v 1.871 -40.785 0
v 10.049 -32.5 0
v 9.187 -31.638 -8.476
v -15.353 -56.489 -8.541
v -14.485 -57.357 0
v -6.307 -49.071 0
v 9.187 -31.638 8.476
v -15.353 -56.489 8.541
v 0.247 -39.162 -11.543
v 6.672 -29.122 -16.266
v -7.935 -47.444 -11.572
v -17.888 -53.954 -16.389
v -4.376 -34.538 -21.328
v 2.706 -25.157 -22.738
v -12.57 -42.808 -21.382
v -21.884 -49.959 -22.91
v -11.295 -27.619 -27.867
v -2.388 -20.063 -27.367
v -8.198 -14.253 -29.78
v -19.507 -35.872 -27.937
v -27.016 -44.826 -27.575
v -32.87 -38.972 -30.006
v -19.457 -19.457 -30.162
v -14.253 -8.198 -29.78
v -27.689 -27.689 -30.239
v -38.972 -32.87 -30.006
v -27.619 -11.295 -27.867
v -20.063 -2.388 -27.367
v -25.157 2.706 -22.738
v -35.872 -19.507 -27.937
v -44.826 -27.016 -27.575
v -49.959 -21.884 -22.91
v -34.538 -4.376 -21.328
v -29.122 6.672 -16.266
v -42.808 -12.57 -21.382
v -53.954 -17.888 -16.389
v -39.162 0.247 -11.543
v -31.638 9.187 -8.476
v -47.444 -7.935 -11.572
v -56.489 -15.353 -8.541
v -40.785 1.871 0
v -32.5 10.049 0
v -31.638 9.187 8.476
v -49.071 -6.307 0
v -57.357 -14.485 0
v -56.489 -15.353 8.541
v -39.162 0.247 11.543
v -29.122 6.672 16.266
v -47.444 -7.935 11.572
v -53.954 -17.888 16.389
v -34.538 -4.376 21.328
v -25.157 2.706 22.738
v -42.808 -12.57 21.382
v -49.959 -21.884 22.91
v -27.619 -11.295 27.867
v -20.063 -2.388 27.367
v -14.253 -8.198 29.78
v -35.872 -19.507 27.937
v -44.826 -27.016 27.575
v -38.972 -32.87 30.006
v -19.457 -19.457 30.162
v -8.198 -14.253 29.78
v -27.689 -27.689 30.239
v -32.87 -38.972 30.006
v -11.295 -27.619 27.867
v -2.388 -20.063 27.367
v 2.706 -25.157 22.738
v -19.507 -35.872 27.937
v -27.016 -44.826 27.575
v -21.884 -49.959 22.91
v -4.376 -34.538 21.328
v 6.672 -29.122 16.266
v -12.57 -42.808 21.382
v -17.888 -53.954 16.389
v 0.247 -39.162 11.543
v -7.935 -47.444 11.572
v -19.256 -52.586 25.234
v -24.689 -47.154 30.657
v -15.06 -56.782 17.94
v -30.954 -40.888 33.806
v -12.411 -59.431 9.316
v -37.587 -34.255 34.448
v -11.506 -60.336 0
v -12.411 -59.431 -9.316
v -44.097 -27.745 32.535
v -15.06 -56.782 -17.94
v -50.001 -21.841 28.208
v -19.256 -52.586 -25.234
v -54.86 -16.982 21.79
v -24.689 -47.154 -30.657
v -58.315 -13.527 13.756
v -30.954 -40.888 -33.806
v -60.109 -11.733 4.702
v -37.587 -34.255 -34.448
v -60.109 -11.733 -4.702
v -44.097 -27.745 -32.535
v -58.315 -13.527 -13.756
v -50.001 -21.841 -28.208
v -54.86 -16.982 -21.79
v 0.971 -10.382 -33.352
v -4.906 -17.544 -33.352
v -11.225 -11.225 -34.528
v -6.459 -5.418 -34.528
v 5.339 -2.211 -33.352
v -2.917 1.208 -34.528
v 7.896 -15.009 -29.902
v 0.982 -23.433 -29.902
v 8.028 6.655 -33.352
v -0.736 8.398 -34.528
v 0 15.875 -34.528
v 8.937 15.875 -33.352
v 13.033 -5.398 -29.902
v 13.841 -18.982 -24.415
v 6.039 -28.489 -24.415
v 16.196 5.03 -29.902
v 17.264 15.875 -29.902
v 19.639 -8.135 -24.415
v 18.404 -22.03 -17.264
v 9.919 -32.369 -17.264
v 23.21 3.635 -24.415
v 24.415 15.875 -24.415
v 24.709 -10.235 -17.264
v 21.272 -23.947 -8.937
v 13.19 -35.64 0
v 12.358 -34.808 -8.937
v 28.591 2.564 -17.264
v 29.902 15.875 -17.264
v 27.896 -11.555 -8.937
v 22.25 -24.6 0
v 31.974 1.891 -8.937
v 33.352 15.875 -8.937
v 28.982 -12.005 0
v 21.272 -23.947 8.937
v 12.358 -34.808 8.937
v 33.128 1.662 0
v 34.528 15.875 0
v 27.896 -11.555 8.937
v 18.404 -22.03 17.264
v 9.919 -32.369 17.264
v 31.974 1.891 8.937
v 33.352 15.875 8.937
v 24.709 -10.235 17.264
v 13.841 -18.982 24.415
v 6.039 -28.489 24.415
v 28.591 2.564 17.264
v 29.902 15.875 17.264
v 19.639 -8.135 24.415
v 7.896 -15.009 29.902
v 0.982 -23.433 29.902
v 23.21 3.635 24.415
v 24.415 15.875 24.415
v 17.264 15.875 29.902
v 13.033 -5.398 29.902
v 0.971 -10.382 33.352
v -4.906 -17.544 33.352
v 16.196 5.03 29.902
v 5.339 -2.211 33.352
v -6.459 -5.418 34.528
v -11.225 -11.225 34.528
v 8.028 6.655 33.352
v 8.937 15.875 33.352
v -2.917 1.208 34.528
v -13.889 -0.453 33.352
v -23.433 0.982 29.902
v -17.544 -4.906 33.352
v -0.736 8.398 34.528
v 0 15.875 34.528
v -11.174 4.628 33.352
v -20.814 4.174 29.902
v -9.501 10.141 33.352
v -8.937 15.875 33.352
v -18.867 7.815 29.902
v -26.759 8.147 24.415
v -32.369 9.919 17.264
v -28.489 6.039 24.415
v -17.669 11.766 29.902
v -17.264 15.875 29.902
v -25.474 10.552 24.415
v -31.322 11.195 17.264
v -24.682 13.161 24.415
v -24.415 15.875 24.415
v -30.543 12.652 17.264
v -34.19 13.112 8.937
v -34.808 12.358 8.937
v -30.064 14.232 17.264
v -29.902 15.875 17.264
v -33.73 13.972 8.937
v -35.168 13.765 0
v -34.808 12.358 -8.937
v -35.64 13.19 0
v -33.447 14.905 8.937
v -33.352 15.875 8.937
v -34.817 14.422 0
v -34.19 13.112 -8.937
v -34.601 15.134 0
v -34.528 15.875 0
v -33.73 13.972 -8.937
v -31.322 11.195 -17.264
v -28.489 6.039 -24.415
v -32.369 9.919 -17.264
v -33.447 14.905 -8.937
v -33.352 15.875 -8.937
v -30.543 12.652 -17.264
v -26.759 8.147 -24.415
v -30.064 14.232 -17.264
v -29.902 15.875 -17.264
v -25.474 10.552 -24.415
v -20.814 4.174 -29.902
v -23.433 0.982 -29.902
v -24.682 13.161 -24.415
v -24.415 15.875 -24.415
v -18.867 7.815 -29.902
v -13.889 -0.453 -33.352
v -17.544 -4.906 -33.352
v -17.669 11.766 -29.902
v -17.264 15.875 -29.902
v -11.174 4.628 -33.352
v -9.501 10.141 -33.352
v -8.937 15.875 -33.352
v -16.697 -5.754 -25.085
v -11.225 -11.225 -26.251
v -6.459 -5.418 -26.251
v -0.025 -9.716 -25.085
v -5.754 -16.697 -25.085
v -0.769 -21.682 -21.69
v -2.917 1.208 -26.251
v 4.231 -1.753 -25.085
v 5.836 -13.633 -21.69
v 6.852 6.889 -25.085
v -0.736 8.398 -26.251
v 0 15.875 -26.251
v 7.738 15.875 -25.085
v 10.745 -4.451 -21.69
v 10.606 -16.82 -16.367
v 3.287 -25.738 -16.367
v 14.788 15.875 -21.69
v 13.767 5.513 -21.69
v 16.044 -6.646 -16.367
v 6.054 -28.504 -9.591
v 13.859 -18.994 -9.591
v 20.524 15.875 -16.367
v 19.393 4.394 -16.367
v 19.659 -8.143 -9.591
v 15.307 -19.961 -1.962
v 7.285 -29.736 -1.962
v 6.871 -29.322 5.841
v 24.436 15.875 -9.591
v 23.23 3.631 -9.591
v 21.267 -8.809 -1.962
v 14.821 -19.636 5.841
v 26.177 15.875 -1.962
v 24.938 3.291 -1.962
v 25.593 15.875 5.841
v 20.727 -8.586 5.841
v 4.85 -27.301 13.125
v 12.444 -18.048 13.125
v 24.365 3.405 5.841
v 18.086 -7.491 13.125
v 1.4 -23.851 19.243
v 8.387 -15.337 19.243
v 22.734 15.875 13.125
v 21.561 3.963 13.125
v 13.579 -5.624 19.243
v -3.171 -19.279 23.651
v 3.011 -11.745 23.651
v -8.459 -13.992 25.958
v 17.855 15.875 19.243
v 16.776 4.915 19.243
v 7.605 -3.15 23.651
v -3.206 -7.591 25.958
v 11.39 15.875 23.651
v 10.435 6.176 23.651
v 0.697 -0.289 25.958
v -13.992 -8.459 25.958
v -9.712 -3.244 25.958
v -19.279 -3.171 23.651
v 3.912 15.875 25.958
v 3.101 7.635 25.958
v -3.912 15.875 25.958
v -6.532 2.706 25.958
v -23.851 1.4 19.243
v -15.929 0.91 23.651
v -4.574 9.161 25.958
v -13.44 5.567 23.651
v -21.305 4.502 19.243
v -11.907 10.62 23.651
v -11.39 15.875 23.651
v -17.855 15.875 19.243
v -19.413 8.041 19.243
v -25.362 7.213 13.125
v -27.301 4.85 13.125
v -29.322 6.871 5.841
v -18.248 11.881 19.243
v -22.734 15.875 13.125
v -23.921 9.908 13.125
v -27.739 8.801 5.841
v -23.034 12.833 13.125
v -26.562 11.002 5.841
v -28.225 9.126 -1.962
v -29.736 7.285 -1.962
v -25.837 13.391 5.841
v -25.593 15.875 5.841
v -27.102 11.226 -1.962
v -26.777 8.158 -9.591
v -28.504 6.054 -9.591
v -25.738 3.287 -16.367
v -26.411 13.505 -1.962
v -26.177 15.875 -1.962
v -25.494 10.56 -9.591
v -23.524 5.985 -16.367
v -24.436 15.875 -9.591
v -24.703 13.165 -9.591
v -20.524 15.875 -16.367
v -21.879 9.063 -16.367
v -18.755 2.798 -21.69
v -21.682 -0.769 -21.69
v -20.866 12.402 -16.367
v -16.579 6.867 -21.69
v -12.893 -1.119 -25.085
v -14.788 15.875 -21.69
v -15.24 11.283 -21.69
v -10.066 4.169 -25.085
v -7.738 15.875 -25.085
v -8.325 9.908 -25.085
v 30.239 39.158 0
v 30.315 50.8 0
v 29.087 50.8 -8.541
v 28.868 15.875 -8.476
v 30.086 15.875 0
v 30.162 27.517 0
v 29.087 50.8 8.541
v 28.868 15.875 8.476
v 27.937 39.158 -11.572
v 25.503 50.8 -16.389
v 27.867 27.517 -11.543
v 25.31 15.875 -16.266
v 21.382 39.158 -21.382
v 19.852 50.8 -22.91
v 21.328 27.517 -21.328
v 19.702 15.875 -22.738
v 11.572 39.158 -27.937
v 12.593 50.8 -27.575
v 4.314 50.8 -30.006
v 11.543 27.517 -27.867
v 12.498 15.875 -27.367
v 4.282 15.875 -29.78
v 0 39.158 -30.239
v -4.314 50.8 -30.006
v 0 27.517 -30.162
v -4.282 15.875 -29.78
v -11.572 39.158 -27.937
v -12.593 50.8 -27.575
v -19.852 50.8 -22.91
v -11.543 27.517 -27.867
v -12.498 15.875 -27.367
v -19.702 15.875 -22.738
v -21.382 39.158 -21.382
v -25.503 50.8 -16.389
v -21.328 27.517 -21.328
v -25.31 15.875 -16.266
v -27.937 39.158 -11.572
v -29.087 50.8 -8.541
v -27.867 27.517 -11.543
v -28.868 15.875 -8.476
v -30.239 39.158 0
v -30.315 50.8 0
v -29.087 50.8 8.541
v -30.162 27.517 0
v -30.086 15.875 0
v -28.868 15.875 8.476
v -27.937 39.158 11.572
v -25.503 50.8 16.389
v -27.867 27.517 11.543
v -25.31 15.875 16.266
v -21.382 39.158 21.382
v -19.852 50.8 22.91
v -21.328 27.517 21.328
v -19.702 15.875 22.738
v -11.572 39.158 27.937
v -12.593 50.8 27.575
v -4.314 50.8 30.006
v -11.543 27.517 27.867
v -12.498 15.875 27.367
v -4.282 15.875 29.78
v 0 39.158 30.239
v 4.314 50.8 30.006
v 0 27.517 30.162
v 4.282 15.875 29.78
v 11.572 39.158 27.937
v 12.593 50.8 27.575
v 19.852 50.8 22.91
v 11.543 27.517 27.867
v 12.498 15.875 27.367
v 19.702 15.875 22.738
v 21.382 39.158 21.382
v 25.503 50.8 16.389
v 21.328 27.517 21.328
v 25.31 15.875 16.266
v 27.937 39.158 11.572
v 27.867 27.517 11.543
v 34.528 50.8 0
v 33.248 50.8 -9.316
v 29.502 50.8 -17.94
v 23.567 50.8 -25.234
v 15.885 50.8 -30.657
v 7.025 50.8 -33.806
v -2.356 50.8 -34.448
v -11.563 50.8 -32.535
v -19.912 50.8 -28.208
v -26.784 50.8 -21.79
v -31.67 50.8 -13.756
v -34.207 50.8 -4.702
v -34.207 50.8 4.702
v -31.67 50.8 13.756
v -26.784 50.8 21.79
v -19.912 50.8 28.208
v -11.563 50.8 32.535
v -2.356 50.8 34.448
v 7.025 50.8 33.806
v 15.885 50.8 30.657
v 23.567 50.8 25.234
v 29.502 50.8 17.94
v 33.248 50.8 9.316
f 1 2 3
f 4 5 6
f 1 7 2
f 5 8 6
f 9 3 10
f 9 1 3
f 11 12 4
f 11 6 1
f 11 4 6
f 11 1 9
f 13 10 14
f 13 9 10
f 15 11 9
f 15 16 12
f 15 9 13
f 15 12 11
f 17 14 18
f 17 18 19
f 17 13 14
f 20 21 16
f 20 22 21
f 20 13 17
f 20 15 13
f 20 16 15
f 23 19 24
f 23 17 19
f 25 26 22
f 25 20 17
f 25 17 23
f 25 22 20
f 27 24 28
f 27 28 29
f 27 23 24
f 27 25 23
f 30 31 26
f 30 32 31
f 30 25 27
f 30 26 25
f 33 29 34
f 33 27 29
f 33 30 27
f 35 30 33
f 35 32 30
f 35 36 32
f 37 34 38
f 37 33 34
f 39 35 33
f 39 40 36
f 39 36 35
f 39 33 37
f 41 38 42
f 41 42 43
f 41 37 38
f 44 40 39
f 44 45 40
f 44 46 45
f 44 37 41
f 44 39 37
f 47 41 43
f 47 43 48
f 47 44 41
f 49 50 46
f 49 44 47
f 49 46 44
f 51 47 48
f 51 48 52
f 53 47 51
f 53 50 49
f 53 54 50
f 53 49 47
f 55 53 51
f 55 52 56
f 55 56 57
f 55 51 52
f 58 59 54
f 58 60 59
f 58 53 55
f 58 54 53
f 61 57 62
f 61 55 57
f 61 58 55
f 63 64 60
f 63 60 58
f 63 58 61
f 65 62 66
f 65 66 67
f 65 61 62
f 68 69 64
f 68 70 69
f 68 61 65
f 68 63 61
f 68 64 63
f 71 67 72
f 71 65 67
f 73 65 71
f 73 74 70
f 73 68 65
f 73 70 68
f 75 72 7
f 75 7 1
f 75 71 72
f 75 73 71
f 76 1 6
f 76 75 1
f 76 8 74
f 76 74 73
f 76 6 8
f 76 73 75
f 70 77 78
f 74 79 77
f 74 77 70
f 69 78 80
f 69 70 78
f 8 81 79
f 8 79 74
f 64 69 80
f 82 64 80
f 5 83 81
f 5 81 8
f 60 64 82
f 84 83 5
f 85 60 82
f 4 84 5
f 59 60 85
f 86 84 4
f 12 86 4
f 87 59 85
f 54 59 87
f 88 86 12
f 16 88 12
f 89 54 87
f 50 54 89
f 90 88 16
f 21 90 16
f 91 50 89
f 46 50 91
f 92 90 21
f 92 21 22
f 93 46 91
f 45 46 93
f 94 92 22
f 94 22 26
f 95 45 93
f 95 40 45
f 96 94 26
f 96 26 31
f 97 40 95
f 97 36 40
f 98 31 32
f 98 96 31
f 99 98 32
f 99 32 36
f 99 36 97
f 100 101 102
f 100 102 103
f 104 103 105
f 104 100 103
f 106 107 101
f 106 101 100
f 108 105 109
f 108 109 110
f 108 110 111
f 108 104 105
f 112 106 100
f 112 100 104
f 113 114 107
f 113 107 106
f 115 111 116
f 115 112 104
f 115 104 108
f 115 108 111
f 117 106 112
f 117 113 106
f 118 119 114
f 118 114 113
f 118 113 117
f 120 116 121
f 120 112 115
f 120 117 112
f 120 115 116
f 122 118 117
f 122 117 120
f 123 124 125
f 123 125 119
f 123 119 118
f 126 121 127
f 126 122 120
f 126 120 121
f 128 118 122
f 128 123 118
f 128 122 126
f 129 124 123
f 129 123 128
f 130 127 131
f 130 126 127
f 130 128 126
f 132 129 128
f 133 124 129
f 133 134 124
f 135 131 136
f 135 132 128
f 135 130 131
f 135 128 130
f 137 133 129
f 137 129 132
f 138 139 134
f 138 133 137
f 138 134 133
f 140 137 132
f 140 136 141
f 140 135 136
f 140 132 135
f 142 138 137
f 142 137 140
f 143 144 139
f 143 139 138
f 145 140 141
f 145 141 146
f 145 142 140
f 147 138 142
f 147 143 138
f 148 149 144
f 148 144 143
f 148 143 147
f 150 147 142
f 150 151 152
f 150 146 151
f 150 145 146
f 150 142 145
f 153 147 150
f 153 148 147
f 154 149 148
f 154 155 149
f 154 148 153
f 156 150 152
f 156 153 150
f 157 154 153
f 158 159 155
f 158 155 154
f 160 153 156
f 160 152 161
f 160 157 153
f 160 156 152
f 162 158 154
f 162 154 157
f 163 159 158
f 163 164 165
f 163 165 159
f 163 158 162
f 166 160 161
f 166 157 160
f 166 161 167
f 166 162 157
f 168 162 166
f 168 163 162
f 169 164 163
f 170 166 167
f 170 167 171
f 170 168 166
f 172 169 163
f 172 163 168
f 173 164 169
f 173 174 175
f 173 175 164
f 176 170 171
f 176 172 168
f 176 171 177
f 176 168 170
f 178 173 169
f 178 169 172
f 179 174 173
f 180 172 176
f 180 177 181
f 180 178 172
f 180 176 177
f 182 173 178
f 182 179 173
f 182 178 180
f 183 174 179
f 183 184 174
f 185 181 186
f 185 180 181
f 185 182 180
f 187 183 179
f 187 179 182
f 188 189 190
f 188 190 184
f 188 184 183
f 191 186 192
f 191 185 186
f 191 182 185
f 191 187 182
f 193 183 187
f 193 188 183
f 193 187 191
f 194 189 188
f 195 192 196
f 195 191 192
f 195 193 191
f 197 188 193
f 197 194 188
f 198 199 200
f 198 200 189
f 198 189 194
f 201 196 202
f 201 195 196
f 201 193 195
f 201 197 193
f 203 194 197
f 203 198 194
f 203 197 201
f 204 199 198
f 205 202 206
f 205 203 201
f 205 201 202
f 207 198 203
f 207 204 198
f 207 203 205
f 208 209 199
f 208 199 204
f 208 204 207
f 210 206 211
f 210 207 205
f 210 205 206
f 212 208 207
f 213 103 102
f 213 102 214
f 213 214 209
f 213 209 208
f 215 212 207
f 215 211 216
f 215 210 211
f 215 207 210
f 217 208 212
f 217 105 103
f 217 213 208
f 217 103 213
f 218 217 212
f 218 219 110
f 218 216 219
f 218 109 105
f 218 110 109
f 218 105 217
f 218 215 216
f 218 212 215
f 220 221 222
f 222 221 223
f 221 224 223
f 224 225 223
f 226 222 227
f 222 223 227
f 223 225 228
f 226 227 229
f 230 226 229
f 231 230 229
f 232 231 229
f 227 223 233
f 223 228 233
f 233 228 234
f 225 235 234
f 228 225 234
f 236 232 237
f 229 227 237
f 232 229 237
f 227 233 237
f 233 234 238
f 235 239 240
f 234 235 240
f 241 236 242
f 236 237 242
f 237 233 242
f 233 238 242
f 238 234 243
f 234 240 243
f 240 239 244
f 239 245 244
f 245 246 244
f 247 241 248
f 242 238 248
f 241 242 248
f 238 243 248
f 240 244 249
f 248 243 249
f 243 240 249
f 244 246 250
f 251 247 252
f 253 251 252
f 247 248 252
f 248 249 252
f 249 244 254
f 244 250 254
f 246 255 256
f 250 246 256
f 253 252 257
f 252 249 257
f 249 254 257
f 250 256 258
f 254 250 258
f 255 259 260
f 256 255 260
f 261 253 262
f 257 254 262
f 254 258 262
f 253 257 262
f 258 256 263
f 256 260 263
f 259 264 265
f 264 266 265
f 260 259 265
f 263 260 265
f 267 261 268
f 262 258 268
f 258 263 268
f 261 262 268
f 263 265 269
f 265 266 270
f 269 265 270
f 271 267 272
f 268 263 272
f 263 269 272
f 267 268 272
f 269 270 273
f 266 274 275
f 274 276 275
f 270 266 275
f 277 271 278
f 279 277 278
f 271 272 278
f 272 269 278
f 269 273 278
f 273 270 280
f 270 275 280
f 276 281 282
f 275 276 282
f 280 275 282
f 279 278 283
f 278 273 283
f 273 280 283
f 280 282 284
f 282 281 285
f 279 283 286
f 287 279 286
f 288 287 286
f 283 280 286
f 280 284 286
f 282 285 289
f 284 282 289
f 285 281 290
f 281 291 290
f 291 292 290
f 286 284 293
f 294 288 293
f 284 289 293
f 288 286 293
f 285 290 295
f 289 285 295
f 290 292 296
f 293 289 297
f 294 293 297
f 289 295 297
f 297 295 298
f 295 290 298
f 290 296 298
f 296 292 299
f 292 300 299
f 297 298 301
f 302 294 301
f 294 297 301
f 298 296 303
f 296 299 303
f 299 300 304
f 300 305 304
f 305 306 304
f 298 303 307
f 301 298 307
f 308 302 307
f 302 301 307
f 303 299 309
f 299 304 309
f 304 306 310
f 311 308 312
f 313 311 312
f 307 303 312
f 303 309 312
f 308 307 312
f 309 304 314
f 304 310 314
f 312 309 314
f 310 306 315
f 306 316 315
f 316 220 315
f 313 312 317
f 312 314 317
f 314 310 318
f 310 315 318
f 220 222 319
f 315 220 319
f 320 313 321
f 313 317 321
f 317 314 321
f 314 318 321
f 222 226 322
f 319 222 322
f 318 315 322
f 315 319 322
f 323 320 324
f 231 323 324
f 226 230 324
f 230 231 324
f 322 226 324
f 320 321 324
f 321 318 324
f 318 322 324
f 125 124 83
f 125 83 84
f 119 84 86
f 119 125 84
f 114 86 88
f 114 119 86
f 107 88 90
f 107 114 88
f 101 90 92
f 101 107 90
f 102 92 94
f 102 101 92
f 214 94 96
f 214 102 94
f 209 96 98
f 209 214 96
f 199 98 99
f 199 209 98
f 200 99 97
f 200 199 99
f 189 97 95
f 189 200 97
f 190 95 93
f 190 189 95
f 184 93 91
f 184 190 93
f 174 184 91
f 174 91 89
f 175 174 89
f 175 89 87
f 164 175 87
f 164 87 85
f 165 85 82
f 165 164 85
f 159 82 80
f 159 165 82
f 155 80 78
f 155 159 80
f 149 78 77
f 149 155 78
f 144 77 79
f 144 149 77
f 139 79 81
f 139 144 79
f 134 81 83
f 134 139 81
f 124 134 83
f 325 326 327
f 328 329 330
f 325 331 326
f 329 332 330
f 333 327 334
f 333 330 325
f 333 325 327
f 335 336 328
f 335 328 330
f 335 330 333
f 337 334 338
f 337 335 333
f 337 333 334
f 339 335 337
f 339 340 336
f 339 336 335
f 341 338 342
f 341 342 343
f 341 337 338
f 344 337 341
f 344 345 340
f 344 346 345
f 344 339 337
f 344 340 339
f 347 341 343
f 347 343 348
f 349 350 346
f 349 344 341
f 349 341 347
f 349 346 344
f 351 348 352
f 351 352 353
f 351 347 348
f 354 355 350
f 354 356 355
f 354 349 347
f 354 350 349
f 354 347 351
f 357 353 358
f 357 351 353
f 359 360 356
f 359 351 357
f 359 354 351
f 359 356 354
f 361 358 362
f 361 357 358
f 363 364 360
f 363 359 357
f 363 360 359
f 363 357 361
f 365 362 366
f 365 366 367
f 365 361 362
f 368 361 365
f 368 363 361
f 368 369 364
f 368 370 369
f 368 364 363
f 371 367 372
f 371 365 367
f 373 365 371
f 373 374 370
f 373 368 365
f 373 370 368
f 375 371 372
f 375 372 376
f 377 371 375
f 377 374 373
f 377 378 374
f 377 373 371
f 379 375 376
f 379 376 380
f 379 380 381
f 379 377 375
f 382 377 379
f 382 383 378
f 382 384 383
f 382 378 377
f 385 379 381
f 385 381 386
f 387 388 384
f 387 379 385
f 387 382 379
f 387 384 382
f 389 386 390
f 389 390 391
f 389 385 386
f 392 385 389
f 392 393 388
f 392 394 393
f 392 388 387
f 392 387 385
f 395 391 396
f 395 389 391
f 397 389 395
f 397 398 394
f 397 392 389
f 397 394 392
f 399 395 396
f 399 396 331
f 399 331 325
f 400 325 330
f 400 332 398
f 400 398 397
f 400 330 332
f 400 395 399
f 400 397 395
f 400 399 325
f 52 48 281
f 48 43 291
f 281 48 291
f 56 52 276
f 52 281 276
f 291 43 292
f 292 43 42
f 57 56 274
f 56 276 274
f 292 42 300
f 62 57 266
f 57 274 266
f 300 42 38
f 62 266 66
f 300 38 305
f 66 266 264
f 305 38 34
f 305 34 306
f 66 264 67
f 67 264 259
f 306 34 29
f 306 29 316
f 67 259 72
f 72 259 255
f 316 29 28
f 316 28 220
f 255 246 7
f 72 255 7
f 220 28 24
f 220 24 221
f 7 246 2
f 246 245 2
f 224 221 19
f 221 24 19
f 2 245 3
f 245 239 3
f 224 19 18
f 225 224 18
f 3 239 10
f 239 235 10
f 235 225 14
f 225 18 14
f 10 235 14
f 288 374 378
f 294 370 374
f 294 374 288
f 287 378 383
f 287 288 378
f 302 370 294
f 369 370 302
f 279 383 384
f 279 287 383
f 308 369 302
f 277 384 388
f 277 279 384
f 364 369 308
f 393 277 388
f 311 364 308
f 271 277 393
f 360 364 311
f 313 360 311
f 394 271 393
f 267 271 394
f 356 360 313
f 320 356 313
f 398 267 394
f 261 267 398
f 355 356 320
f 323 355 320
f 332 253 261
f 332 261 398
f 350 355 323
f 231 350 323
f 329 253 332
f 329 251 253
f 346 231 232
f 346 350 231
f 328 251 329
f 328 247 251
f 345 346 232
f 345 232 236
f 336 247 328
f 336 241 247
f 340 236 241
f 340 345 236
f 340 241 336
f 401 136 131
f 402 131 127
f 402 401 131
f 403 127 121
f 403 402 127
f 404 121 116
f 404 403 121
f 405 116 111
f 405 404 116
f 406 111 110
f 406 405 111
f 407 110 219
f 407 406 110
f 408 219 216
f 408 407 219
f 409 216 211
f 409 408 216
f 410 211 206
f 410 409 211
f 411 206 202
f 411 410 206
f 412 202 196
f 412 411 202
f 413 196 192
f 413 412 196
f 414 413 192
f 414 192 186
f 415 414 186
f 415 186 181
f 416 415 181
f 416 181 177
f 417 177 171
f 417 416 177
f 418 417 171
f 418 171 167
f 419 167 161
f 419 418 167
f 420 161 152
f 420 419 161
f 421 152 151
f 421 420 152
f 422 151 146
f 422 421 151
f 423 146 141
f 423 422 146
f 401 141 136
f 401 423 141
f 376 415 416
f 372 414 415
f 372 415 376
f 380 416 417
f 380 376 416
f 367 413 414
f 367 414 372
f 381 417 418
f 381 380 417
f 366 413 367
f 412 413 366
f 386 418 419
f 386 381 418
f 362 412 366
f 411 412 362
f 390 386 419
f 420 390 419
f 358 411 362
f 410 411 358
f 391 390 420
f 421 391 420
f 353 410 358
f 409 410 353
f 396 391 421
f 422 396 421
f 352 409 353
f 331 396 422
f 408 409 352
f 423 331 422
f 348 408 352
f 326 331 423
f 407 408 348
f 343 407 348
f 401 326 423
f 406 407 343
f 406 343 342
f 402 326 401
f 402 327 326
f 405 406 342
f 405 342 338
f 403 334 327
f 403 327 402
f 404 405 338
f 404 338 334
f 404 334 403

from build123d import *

# Parameters (mm, degrees)
SKETCH3_R   = 34.528125
SKETCH3_R_2 = 26.2509


with BuildPart() as part:
    # Sketch1 → Revolve1 (revolve)
    with BuildSketch(Plane.XY):
        Polygon((-11.505953155, -60.336095813), (13.189751178, -35.64039148), (10.048906599, -32.499546902), (-14.485153123, -57.356895845), align=None)
    revolve(axis=Axis((-35.921024484, -35.921024484, 0), (0.7071067811865486, 0.7071067811865465, 0)))



with BuildPart() as body_2:
    # Sketch2 → Revolve2 (revolve)
    with BuildSketch(Plane.XY):
        Polygon((30.3149, 50.8), (30.0863, 15.875), (34.528125, 15.875), (34.528125, 50.8), align=None)
    revolve(axis=Axis((0, 0, 0), (0, 1, 0)))


with BuildPart() as part_1:
    add(part.part)

    add(body_2.part)  # Sweep1 merges body 2
    # Sweep1: sweep along a path in Sketch4
    with BuildLine(Plane.XY) as sweep1_path:
        ThreePointArc((-11.225320151, -11.225320151), (-2.917365657, 1.208412421), (0, 15.875))
    # Sketch3 → Sweep1 (sweep)
    with BuildSketch(Plane(origin=(-11.225320151, -11.225320151, 0), x_dir=(0, 0, -1), z_dir=(0.7071067811865488, 0.7071067811865464, 0))):
        Circle(SKETCH3_R)
        Circle(SKETCH3_R_2, mode=Mode.SUBTRACT)
    sweep(path=sweep1_path.line)


solid = part_1.part
